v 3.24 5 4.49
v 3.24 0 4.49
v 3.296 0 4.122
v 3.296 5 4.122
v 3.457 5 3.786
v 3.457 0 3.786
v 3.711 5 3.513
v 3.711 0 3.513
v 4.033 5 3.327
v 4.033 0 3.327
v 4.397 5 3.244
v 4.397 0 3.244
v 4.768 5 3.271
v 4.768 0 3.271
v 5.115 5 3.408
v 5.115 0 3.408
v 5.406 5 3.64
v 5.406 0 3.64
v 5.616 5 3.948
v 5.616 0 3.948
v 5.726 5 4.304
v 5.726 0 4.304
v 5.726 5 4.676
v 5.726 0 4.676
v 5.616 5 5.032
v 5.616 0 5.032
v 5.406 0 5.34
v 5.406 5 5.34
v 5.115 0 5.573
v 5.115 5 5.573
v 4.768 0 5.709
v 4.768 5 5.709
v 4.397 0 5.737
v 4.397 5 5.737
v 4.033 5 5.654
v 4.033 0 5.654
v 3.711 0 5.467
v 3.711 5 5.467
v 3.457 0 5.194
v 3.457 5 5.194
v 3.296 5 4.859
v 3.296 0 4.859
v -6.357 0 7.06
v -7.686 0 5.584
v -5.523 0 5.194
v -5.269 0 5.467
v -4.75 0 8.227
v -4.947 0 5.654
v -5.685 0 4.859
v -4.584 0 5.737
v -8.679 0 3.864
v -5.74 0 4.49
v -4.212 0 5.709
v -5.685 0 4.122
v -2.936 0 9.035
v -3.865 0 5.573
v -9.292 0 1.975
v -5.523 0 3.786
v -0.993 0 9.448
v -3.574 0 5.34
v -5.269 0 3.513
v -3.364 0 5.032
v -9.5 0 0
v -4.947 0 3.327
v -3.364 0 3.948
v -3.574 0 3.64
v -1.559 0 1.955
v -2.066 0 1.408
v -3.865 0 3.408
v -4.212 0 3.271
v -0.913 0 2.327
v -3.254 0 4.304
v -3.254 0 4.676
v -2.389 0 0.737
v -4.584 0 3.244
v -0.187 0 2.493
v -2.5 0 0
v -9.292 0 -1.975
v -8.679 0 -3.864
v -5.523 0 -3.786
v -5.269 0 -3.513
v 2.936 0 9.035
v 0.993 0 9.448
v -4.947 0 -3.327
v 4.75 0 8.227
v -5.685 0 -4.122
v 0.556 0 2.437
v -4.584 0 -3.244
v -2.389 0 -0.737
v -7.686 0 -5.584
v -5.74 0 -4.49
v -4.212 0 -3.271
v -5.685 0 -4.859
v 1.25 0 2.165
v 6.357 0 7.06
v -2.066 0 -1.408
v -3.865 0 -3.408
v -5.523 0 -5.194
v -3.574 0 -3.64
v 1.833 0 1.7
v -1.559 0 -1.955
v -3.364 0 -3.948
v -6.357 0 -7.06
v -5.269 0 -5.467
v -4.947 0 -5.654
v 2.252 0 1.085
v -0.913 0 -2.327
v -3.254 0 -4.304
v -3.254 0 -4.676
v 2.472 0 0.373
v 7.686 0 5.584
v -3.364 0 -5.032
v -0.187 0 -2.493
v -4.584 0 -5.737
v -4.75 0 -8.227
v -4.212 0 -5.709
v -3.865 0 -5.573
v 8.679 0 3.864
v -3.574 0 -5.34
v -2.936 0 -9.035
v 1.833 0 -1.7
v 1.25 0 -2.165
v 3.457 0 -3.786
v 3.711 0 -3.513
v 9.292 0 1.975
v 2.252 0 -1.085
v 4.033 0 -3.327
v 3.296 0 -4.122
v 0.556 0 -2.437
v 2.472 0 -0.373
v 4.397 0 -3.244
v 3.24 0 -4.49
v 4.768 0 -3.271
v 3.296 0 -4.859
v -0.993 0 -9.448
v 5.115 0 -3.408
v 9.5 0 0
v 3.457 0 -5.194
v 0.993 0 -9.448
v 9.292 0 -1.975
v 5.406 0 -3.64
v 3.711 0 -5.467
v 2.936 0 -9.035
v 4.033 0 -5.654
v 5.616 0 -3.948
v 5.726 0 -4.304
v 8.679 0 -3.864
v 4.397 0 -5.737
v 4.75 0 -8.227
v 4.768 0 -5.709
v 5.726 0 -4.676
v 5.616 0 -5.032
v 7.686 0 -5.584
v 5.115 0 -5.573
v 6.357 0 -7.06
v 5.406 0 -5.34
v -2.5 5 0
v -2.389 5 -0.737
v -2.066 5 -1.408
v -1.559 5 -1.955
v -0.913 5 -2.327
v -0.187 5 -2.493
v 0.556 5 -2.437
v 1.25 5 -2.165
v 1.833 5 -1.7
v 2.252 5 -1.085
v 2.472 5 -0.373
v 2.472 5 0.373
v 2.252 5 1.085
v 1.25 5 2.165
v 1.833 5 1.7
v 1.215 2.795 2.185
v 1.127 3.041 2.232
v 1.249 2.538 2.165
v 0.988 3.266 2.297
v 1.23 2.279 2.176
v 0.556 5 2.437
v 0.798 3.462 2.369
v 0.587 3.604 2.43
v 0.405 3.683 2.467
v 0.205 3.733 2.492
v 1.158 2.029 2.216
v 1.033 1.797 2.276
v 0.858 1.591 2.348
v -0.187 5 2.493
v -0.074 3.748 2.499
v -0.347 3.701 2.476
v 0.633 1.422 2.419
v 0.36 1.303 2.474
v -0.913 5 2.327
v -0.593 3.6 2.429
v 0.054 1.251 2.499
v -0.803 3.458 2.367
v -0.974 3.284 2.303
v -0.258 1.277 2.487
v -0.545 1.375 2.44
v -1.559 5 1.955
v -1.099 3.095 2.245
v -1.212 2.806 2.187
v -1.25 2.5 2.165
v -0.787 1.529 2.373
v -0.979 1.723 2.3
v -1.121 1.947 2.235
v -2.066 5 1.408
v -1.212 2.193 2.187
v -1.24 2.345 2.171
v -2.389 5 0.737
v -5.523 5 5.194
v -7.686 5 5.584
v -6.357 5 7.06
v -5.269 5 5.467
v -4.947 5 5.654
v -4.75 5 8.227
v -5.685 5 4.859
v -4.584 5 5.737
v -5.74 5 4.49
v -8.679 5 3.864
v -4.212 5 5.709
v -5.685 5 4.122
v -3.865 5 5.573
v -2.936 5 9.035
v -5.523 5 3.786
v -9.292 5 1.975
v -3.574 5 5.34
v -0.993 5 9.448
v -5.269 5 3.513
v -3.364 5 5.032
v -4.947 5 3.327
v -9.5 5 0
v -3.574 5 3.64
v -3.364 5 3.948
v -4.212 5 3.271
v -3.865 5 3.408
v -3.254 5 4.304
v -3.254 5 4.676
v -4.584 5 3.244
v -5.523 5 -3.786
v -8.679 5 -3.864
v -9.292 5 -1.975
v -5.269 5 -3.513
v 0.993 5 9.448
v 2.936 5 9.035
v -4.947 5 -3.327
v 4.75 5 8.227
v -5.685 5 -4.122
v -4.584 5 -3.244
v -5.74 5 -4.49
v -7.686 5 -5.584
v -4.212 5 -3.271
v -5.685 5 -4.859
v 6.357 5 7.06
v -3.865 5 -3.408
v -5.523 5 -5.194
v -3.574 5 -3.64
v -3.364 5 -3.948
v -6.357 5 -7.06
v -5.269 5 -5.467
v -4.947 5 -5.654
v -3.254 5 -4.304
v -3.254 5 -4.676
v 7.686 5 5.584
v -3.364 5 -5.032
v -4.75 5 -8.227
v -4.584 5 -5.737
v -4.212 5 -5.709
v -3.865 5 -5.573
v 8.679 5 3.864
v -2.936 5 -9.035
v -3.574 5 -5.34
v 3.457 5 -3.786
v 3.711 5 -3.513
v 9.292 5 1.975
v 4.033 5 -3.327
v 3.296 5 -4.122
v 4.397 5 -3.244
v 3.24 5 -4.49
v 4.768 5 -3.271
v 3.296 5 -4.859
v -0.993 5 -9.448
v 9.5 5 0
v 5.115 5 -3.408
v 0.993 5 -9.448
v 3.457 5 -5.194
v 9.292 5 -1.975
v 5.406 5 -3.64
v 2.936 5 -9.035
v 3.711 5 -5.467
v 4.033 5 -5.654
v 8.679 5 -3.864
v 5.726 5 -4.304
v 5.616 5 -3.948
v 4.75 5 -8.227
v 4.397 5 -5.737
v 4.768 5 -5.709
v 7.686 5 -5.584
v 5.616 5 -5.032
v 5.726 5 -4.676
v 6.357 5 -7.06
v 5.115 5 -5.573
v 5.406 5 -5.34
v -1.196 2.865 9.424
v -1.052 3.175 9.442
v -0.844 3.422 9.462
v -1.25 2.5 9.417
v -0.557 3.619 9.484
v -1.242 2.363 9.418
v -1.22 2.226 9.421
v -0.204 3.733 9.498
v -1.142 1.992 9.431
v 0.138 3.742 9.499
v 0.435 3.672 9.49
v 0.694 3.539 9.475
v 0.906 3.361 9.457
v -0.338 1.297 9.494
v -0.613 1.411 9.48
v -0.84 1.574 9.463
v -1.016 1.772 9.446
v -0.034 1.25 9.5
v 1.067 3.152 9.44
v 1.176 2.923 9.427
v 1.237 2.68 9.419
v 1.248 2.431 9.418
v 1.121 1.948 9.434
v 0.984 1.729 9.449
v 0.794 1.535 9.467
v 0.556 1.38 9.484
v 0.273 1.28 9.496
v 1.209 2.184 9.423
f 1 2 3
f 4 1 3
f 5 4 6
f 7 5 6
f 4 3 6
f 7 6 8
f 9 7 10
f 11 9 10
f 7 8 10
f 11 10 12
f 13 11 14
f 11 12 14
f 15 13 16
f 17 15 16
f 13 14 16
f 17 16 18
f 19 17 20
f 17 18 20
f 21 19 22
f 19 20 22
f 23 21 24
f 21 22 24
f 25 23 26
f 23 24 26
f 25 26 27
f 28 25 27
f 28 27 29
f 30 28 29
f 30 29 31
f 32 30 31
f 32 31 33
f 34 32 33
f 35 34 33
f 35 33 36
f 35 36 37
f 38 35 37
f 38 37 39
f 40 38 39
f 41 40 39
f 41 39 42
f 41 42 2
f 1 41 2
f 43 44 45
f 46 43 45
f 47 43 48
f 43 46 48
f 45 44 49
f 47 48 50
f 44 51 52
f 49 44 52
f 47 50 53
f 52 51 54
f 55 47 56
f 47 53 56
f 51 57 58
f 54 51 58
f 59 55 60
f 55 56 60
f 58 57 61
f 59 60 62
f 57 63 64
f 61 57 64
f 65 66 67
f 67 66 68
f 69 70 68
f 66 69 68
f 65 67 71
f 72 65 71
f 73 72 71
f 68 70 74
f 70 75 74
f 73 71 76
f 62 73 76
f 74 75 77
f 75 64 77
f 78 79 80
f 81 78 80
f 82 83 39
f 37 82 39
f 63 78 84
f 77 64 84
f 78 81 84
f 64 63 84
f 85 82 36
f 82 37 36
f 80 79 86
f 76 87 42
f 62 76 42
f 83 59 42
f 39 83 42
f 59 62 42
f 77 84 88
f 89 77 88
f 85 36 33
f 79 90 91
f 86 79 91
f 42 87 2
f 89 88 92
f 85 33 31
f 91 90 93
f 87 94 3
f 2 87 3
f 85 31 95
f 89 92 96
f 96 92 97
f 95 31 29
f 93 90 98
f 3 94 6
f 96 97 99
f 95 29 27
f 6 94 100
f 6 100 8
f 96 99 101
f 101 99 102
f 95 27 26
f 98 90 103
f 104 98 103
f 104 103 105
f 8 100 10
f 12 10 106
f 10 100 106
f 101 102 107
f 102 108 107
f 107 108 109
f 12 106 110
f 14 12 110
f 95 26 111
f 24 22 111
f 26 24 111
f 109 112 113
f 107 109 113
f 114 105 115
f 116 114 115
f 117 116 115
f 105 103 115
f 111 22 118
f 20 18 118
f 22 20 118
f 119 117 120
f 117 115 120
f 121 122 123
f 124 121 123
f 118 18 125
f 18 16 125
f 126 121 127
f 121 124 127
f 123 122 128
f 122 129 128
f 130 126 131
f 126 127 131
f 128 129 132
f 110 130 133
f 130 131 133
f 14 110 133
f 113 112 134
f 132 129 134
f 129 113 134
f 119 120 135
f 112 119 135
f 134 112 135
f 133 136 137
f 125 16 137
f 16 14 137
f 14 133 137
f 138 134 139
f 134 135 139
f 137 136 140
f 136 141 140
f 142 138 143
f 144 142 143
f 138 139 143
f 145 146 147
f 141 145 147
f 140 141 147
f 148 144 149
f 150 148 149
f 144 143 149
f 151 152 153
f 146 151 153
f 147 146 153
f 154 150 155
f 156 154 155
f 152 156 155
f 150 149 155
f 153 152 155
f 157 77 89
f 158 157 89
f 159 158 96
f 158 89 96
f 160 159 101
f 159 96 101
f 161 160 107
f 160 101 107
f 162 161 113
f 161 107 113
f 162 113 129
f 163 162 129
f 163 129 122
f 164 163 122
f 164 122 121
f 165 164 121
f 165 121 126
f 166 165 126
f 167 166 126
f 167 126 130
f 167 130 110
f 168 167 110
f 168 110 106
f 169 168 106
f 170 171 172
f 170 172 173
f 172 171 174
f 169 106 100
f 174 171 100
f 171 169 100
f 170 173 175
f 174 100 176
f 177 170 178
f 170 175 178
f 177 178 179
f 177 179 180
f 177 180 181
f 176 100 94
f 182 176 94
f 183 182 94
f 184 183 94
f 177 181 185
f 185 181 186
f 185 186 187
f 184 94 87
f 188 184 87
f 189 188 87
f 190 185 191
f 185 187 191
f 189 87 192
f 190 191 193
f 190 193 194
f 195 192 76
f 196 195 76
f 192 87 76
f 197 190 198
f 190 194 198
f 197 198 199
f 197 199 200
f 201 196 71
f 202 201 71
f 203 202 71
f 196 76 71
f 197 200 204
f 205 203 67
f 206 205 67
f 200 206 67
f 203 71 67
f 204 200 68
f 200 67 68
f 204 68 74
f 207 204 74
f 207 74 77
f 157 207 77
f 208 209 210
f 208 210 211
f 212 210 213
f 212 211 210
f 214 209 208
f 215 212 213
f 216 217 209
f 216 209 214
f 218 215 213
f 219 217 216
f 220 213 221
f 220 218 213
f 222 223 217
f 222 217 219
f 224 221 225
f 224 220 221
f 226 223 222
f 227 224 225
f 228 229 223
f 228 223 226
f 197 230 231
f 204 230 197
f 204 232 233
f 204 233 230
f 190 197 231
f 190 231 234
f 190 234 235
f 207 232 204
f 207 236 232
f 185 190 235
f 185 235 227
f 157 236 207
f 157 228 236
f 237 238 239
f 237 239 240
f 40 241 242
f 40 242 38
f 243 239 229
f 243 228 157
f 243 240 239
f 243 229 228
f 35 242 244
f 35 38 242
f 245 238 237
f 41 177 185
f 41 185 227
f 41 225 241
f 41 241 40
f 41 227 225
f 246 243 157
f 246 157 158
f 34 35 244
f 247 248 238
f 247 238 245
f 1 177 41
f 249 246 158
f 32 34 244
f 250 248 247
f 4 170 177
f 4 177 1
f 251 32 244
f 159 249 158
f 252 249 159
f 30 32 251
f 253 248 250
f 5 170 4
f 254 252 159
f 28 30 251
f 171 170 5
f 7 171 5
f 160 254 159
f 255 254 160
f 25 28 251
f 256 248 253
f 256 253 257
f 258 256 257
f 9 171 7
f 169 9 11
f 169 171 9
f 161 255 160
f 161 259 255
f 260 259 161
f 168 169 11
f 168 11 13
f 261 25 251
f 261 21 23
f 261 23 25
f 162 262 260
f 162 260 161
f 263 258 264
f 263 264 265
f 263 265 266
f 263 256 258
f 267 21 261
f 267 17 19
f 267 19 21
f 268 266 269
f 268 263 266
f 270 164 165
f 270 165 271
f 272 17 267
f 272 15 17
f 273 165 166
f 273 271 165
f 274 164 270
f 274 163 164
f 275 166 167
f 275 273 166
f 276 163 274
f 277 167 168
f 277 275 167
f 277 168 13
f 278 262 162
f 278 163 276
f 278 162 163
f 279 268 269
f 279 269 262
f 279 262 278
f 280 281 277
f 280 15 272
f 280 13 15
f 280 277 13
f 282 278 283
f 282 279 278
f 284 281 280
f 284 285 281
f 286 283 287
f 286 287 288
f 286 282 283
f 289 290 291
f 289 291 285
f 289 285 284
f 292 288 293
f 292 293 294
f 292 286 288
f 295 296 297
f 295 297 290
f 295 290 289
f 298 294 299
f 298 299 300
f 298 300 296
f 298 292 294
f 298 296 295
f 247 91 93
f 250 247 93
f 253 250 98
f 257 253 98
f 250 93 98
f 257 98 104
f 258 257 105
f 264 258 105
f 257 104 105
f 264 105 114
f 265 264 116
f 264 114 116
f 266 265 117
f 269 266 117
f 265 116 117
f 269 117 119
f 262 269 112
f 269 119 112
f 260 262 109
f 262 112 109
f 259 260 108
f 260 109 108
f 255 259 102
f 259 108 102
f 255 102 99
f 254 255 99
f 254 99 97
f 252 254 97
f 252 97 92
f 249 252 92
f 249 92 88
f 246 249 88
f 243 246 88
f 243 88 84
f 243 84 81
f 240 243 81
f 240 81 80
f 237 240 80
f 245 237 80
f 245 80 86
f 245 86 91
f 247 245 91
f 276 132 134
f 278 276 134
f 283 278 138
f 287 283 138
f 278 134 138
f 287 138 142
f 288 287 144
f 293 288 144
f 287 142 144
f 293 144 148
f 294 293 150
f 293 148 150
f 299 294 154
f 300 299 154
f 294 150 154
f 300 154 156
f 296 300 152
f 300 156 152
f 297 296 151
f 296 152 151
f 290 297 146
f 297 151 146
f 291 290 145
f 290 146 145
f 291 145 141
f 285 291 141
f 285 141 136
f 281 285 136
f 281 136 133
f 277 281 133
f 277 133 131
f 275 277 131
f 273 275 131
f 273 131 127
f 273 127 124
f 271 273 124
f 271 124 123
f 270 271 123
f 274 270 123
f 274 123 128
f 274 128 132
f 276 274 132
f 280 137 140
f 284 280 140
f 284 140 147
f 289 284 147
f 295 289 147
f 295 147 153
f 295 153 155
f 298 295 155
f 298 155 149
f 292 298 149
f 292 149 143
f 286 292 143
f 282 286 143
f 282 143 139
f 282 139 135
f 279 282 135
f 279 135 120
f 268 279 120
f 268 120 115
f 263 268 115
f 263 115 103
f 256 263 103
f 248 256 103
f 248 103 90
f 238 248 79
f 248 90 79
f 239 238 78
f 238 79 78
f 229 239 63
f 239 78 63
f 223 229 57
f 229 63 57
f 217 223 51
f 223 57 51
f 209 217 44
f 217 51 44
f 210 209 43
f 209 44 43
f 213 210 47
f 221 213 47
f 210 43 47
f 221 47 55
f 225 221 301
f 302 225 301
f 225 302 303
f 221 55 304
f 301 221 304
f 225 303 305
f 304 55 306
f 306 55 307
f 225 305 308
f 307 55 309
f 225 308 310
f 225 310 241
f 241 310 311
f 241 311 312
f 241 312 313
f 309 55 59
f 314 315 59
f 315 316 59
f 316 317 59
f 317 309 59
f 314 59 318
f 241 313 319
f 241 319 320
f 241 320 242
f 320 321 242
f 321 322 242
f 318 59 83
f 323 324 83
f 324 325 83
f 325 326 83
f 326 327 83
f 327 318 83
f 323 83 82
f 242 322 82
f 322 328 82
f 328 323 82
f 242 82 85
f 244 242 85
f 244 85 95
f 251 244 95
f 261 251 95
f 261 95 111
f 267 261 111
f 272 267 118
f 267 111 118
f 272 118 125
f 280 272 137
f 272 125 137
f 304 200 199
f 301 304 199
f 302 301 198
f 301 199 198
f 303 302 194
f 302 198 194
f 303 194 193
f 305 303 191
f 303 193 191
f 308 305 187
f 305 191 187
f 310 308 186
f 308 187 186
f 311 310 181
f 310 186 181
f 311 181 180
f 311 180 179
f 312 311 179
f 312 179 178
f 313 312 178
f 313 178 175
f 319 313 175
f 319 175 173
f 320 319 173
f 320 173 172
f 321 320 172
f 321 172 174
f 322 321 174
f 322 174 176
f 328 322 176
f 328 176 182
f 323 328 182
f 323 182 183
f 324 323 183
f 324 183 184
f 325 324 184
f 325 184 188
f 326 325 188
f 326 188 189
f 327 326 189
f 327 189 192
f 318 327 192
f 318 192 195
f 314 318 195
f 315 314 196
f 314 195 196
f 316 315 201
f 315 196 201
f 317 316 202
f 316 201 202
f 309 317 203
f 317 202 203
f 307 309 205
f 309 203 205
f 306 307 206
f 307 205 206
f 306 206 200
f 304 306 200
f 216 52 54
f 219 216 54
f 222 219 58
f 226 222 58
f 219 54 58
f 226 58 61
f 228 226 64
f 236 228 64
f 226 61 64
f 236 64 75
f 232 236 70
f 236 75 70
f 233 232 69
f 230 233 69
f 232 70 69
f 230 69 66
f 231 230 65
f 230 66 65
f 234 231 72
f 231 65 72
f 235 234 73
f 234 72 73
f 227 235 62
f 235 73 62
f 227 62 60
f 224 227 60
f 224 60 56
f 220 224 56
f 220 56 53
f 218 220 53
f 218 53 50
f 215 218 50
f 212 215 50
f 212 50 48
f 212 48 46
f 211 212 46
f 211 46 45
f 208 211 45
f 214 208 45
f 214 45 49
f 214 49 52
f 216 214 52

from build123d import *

# Parameters (mm, degrees)
SKETCH1_R                 = 9.5
BOSS_EXTRUDE1_DEPTH       = 5
F_5_0MM_DOWEL_HOLE1_D     = 5
M3X0_5_TAPPED_HOLE1_D     = 2.5
M3X0_5_TAPPED_HOLE2_D     = 2.5
M3X0_5_TAPPED_HOLE2_DEPTH = 10
M3X0_5_TAPPED_HOLE2_TIP   = 0.751075774


with BuildPart() as part:
    # Sketch1 → Boss-Extrude1 (new body)
    with BuildSketch(Plane(origin=(0, 0, 0), x_dir=(1, 0, 0), z_dir=(0, 1, 0))):
        Circle(SKETCH1_R)
    extrude(amount=BOSS_EXTRUDE1_DEPTH)

    # Ø5.0mm Dowel Hole1 (through all)
    with Locations(Plane(origin=(0, 5, 0), x_dir=(1, 0, 0), z_dir=(0, 1, 0))):
        with Locations((0, 0)):
            Hole(F_5_0MM_DOWEL_HOLE1_D / 2)

    # M3x0.5 Tapped Hole1 (through all)
    with Locations(Plane(origin=(0, 5, 0), x_dir=(1, 0, 0), z_dir=(0, 1, 0))):
        with Locations((4.490128061, 4.490128061), (-4.490128061, 4.490128061), (-4.490128061, -4.490128061), (4.490128061, -4.490128061)):
            Hole(M3X0_5_TAPPED_HOLE1_D / 2)

    # M3x0.5 Tapped Hole2
    with Locations(Plane(origin=(0, 2.5, 9.5), x_dir=(1, 0, 0), z_dir=(0, 0, 1))):
        with Locations((0, 0)):
            Hole(M3X0_5_TAPPED_HOLE2_D / 2, depth=M3X0_5_TAPPED_HOLE2_DEPTH)
            with Locations((0, 0, -(M3X0_5_TAPPED_HOLE2_DEPTH + M3X0_5_TAPPED_HOLE2_TIP / 2))):  # 118° drill point
                Cone(0, M3X0_5_TAPPED_HOLE2_D / 2, M3X0_5_TAPPED_HOLE2_TIP, mode=Mode.SUBTRACT)


solid = part.part
